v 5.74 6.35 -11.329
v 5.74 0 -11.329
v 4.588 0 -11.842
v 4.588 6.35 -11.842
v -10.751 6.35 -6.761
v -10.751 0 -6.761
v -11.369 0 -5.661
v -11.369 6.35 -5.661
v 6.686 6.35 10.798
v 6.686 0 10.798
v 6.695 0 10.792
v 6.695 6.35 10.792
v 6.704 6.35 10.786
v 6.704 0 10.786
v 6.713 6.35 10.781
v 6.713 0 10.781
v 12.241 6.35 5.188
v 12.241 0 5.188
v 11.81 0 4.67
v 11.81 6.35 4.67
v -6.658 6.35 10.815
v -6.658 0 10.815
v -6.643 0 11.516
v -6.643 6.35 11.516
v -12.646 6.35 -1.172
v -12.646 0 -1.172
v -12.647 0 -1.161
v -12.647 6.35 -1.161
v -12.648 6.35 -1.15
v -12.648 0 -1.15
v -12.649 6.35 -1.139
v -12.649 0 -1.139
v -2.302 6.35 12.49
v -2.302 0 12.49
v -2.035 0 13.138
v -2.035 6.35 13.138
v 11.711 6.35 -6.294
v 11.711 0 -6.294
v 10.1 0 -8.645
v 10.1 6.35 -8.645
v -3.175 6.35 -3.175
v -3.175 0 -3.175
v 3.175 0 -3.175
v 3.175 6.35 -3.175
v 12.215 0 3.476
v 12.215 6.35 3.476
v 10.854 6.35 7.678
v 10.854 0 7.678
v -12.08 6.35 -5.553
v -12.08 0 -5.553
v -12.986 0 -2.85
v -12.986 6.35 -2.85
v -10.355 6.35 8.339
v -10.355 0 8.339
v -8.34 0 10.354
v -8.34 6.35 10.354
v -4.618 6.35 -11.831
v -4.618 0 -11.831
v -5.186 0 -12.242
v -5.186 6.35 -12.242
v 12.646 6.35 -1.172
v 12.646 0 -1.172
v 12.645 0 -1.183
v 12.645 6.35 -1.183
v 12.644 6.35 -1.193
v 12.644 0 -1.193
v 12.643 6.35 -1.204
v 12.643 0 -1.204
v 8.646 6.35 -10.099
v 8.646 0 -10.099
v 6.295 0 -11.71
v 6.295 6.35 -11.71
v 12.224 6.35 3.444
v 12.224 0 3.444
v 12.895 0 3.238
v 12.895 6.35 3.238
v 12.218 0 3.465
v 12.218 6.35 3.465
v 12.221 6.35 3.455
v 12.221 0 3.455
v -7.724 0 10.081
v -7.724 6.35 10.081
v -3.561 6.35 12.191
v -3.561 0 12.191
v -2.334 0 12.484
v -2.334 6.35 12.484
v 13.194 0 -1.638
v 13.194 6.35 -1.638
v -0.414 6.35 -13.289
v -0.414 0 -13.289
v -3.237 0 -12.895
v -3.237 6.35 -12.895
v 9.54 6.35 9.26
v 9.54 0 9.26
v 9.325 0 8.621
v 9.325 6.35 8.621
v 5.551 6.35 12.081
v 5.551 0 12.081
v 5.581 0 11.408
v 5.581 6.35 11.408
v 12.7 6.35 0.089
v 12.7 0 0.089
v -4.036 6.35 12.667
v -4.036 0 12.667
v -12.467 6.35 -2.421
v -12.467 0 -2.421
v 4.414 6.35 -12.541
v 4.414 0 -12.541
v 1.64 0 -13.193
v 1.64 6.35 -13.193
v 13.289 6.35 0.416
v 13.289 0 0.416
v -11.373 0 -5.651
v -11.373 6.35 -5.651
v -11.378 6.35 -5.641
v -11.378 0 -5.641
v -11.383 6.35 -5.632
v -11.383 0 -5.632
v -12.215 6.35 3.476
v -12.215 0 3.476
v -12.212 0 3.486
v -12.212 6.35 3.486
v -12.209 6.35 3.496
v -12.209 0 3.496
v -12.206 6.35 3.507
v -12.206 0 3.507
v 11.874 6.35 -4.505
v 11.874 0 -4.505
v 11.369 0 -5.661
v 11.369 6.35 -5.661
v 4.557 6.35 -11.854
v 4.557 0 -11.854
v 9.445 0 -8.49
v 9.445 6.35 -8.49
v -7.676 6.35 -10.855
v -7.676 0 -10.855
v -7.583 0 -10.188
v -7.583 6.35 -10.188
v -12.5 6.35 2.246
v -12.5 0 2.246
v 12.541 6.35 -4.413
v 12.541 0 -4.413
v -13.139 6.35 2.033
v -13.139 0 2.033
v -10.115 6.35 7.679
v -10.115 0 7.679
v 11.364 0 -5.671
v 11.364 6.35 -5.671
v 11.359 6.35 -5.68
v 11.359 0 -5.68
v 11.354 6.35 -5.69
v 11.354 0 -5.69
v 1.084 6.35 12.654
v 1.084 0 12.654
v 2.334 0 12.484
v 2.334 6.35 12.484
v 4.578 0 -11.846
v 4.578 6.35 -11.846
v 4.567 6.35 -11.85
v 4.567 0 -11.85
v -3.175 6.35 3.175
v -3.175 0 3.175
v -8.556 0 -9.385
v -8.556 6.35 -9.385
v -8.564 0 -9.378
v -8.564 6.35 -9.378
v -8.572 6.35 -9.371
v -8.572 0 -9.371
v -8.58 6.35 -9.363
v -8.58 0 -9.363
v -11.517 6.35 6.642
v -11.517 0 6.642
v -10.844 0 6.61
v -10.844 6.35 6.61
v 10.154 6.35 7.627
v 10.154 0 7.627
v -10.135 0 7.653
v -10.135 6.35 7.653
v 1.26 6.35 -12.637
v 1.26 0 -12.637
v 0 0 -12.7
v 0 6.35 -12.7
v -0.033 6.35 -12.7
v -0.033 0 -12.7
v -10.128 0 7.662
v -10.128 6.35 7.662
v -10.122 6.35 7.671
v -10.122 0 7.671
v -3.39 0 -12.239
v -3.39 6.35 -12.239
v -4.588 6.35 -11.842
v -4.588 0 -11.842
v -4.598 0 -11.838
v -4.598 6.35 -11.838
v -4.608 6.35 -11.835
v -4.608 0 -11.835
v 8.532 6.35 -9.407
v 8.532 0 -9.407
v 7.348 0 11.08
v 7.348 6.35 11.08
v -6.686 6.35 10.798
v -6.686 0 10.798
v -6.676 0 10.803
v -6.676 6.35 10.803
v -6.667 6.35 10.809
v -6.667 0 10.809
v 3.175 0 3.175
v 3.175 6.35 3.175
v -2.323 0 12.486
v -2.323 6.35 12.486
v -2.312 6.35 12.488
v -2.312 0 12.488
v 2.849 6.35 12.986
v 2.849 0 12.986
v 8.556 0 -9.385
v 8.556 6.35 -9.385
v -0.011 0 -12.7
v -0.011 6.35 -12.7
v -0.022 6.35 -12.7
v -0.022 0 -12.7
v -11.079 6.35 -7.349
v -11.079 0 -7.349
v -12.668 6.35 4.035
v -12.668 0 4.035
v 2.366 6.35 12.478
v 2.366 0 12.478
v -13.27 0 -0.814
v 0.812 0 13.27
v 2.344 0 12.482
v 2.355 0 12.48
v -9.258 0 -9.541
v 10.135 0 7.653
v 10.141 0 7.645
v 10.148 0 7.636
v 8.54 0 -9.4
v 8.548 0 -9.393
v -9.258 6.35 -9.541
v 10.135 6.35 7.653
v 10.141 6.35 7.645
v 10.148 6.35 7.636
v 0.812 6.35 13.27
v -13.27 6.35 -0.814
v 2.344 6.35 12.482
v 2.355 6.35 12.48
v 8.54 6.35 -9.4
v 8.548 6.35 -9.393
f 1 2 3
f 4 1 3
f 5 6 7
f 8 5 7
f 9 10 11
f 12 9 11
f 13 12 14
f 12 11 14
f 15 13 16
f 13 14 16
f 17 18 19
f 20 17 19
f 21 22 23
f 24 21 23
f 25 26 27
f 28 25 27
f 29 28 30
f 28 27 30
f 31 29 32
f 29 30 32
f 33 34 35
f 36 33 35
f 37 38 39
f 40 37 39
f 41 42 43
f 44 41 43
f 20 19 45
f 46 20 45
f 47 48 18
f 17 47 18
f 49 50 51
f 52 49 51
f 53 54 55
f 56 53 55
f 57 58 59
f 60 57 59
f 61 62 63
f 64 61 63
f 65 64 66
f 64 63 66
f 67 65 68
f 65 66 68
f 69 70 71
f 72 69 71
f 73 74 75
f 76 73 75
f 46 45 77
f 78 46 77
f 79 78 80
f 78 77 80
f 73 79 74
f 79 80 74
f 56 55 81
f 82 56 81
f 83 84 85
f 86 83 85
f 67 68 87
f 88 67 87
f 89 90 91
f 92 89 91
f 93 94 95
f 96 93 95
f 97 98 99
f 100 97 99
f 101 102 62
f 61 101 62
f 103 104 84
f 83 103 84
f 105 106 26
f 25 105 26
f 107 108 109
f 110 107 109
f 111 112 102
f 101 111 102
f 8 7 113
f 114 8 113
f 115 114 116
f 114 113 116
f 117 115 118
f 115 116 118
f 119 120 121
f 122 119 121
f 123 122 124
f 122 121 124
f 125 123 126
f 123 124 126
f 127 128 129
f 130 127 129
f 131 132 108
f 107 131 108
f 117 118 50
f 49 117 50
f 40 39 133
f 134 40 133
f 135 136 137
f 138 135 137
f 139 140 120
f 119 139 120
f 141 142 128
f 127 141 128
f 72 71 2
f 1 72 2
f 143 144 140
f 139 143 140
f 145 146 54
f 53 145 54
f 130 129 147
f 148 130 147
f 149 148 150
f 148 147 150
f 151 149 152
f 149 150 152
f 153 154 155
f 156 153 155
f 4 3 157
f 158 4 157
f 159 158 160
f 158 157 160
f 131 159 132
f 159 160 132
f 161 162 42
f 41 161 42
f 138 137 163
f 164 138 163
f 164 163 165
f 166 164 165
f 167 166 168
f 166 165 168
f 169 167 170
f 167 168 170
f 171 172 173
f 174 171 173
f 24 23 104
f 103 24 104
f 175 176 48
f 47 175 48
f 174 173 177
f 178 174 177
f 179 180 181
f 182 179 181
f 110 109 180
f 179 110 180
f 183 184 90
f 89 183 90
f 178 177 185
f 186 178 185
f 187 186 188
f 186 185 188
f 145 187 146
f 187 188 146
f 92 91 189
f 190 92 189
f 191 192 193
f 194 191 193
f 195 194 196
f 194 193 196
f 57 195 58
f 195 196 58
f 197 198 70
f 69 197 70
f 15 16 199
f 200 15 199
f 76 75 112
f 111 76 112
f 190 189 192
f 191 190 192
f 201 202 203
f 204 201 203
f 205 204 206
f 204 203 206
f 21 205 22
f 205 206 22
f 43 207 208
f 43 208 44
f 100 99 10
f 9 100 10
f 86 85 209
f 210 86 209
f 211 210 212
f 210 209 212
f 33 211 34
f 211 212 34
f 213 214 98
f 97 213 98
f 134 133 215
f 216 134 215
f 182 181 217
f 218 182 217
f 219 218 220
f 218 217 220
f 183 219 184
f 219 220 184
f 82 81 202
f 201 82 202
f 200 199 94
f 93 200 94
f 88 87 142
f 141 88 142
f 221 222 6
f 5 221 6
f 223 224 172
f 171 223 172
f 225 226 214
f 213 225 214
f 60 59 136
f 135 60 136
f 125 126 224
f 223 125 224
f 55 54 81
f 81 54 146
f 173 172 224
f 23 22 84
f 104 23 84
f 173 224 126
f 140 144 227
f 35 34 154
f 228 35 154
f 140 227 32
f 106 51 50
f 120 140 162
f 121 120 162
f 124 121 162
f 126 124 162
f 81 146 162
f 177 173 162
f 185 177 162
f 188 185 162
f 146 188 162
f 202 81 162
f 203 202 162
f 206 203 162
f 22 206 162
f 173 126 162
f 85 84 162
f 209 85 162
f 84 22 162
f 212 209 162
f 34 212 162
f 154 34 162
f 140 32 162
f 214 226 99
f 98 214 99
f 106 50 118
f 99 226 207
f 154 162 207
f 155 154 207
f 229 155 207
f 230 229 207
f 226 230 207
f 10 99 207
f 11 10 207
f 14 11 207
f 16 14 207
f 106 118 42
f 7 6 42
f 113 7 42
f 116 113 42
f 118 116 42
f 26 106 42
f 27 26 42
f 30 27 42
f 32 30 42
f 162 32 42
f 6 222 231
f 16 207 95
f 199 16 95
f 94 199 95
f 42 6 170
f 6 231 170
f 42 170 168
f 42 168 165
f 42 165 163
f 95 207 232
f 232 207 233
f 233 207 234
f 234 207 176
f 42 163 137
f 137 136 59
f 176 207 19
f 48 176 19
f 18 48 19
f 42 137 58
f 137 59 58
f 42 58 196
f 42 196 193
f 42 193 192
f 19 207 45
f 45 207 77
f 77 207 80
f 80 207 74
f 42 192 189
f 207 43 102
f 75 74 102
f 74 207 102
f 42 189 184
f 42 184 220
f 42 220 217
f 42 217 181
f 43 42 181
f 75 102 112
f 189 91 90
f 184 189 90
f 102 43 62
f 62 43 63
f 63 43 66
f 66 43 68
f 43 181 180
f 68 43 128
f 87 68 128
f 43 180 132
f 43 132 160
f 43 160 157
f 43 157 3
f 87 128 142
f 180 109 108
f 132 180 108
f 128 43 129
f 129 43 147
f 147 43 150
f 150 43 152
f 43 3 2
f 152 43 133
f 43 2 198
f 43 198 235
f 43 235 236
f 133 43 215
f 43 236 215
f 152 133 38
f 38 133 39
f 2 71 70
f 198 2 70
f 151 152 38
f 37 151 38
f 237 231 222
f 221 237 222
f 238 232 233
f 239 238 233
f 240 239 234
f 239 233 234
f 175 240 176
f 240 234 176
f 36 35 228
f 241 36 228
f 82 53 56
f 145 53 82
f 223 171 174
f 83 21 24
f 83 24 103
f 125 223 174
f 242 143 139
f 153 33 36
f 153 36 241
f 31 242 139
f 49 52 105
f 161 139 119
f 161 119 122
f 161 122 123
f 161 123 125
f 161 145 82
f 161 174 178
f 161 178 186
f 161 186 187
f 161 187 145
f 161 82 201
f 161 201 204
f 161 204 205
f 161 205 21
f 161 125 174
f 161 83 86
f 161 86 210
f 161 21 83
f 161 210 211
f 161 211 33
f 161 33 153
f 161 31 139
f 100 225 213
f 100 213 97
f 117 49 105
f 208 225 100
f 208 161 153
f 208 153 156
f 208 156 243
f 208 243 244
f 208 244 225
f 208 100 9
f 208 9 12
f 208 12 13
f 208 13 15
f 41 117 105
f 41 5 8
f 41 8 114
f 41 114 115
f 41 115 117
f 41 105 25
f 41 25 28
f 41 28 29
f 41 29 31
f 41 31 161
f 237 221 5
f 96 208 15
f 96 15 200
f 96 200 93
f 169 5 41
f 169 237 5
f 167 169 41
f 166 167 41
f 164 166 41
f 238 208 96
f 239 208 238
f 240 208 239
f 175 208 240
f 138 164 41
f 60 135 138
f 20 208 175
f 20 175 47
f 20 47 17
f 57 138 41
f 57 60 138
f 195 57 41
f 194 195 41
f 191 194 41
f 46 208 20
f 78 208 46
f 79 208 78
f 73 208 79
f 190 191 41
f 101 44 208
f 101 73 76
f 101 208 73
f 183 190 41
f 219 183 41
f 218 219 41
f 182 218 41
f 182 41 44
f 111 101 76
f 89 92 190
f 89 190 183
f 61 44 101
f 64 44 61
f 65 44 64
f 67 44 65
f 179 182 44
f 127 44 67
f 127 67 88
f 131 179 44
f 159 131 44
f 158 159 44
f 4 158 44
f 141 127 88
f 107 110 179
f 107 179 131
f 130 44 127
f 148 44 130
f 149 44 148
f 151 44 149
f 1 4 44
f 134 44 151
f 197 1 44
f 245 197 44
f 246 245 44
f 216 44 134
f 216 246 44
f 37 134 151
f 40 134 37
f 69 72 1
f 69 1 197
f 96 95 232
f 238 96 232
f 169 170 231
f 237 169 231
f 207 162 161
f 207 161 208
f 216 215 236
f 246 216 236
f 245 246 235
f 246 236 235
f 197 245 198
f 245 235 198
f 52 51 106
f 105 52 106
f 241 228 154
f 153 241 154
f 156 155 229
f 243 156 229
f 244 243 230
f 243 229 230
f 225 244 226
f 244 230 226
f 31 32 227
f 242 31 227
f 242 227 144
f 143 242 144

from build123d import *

# Parameters (mm, degrees)
BELT_PULLEY_W       = 6.35
BELT_PULLEY_H       = 6.35
BOSS_EXTRUDE1_DEPTH = 6.35


with BuildPart() as part:
    # Belt Pulley → Boss-Extrude1 (new body)
    with BuildSketch(Plane(origin=(0, 0, 0), x_dir=(1, 0, 0), z_dir=(0, 1, 0))):
        with BuildLine():
            Line((1.26, 12.637341493), (0, 12.7))
            ThreePointArc((0, 12.7), (-0.016303366, 12.699989535), (-0.032606705, 12.699958142))
            Line((-0.032606705, 12.699958142), (-0.41408034, 13.288550052))
            Line((-0.41408034, 13.288550052), (-3.23677354, 12.894972743))
            Line((-3.23677354, 12.894972743), (-3.390219288, 12.239134495))
            Line((-3.390219288, 12.239134495), (-4.587769161, 11.842397313))
            ThreePointArc((-4.587769161, 11.842397313), (-4.602967816, 11.8364981), (-4.618158887, 11.830579381))
            Line((-4.618158887, 11.830579381), (-5.18649638, 12.24162082))
            Line((-5.18649638, 12.24162082), (-7.676402878, 10.854946515))
            Line((-7.676402878, 10.854946515), (-7.582570675, 10.187964564))
            Line((-7.582570675, 10.187964564), (-8.555934674, 9.385413249))
            ThreePointArc((-8.555934674, 9.385413249), (-8.567975957, 9.374422009), (-8.58000312, 9.36341532))
            Line((-8.58000312, 9.36341532), (-9.258447344, 9.541392864))
            Line((-9.258447344, 9.541392864), (-11.079291471, 7.348899611))
            Line((-11.079291471, 7.348899611), (-10.750853876, 6.760853565))
            Line((-10.750853876, 6.760853565), (-11.3685738, 5.660877118))
            ThreePointArc((-11.3685738, 5.660877118), (-11.375831468, 5.646278279), (-11.383070389, 5.631670135))
            Line((-11.383070389, 5.631670135), (-12.079993691, 5.55254693))
            Line((-12.079993691, 5.55254693), (-12.985860359, 2.850343093))
            Line((-12.985860359, 2.850343093), (-12.467174689, 2.42065183))
            Line((-12.467174689, 2.42065183), (-12.645824039, 1.171808165))
            ThreePointArc((-12.645824039, 1.171808165), (-12.647317904, 1.155573381), (-12.648790926, 1.139336692))
            Line((-12.648790926, 1.139336692), (-13.270069953, 0.813798767))
            Line((-13.270069953, 0.813798767), (-13.138616847, -2.033168055))
            Line((-13.138616847, -2.033168055), (-12.499734477, -2.246472349))
            Line((-12.499734477, -2.246472349), (-12.215185668, -3.475519974))
            ThreePointArc((-12.215185668, -3.475519974), (-12.210713975, -3.491198106), (-12.20622216, -3.506870484))
            Line((-12.20622216, -3.506870484), (-12.667949736, -4.03485743))
            Line((-12.667949736, -4.03485743), (-11.516930327, -6.64208859))
            Line((-11.516930327, -6.64208859), (-10.84413586, -6.610197989))
            Line((-10.84413586, -6.610197989), (-10.134818786, -7.653459882))
            ThreePointArc((-10.134818786, -7.653459882), (-10.124985463, -7.666463943), (-10.115135453, -7.679455369))
            Line((-10.115135453, -7.679455369), (-10.354952711, -8.338583773))
            Line((-10.354952711, -8.338583773), (-8.339818549, -10.353958256))
            Line((-8.339818549, -10.353958256), (-7.723976606, -10.081179762))
            Line((-7.723976606, -10.081179762), (-6.685688469, -10.797757624))
            ThreePointArc((-6.685688469, -10.797757624), (-6.671821559, -10.806331343), (-6.657943654, -10.814887253))
            Line((-6.657943654, -10.814887253), (-6.643461944, -11.516138172))
            Line((-6.643461944, -11.516138172), (-4.036368063, -12.667468487))
            Line((-4.036368063, -12.667468487), (-3.560651511, -12.190642346))
            Line((-3.560651511, -12.190642346), (-2.333618876, -12.483758366))
            ThreePointArc((-2.333618876, -12.483758366), (-2.317591183, -12.486743815), (-2.301559671, -12.489708687))
            Line((-2.301559671, -12.489708687), (-2.034734829, -13.138374297))
            Line((-2.034734829, -13.138374297), (0.812216296, -13.270166905))
            Line((0.812216296, -13.270166905), (1.0835593, -12.653691131))
            Line((1.0835593, -12.653691131), (2.333618876, -12.483758366))
            ThreePointArc((2.333618876, -12.483758366), (2.349642724, -12.480752344), (2.365662699, -12.477725754))
            Line((2.365662699, -12.477725754), (2.8487945, -12.986200172))
            Line((2.8487945, -12.986200172), (5.551106344, -12.08065575))
            Line((5.551106344, -12.08065575), (5.581429424, -11.407788812))
            Line((5.581429424, -11.407788812), (6.685688469, -10.797757624))
            ThreePointArc((6.685688469, -10.797757624), (6.699544361, -10.78916611), (6.713389212, -10.780556817))
            Line((6.713389212, -10.780556817), (7.347578346, -11.080167754))
            Line((7.347578346, -11.080167754), (9.54028872, -9.259585095))
            Line((9.54028872, -9.259585095), (9.325496576, -8.621201402))
            Line((9.325496576, -8.621201402), (10.134818786, -7.653459882))
            ThreePointArc((10.134818786, -7.653459882), (10.144635409, -7.640443209), (10.154435313, -7.627413944))
            Line((10.154435313, -7.627413944), (10.854031022, -7.677697283))
            Line((10.854031022, -7.677697283), (12.24100224, -5.187956164))
            Line((12.24100224, -5.187956164), (11.810103742, -4.67027297))
            Line((11.810103742, -4.67027297), (12.215185668, -3.475519974))
            ThreePointArc((12.215185668, -3.475519974), (12.219637231, -3.459836115), (12.224068656, -3.444146554))
            Line((12.224068656, -3.444146554), (12.894586664, -3.238311251))
            Line((12.894586664, -3.238311251), (13.288500578, -0.415665006))
            Line((13.288500578, -0.415665006), (12.699690955, -0.088598295))
            Line((12.699690955, -0.088598295), (12.645824039, 1.171808165))
            ThreePointArc((12.645824039, 1.171808165), (12.644309334, 1.188041018), (12.642773792, 1.204271914))
            Line((12.642773792, 1.204271914), (13.193656926, 1.638426659))
            Line((13.193656926, 1.638426659), (12.541313278, 4.412764015))
            Line((12.541313278, 4.412764015), (11.874114533, 4.505042071))
            Line((11.874114533, 4.505042071), (11.3685738, 5.660877118))
            ThreePointArc((11.3685738, 5.660877118), (11.361297397, 5.675466629), (11.354002271, 5.690046786))
            Line((11.354002271, 5.690046786), (11.710850711, 6.293885971))
            Line((11.710850711, 6.293885971), (10.100352127, 8.645224804))
            Line((10.100352127, 8.645224804), (9.444873147, 8.490251542))
            Line((9.444873147, 8.490251542), (8.555934674, 9.385413249))
            ThreePointArc((8.555934674, 9.385413249), (8.543879292, 9.396389022), (8.531809829, 9.40734931))
            Line((8.531809829, 9.40734931), (8.646429216, 10.099321106))
            Line((8.646429216, 10.099321106), (6.295282453, 11.710100078))
            Line((6.295282453, 11.710100078), (5.740049306, 11.328805496))
            Line((5.740049306, 11.328805496), (4.587769161, 11.842397313))
            ThreePointArc((4.587769161, 11.842397313), (4.572562944, 11.848277011), (4.557349193, 11.854137182))
            Line((4.557349193, 11.854137182), (4.414259544, 12.540786964))
            Line((4.414259544, 12.540786964), (1.64, 13.193461449))
            Line((1.64, 13.193461449), (1.26, 12.637341493))
        make_face()
        Rectangle(BELT_PULLEY_W, BELT_PULLEY_H, mode=Mode.SUBTRACT)
    extrude(amount=BOSS_EXTRUDE1_DEPTH)


solid = part.part
